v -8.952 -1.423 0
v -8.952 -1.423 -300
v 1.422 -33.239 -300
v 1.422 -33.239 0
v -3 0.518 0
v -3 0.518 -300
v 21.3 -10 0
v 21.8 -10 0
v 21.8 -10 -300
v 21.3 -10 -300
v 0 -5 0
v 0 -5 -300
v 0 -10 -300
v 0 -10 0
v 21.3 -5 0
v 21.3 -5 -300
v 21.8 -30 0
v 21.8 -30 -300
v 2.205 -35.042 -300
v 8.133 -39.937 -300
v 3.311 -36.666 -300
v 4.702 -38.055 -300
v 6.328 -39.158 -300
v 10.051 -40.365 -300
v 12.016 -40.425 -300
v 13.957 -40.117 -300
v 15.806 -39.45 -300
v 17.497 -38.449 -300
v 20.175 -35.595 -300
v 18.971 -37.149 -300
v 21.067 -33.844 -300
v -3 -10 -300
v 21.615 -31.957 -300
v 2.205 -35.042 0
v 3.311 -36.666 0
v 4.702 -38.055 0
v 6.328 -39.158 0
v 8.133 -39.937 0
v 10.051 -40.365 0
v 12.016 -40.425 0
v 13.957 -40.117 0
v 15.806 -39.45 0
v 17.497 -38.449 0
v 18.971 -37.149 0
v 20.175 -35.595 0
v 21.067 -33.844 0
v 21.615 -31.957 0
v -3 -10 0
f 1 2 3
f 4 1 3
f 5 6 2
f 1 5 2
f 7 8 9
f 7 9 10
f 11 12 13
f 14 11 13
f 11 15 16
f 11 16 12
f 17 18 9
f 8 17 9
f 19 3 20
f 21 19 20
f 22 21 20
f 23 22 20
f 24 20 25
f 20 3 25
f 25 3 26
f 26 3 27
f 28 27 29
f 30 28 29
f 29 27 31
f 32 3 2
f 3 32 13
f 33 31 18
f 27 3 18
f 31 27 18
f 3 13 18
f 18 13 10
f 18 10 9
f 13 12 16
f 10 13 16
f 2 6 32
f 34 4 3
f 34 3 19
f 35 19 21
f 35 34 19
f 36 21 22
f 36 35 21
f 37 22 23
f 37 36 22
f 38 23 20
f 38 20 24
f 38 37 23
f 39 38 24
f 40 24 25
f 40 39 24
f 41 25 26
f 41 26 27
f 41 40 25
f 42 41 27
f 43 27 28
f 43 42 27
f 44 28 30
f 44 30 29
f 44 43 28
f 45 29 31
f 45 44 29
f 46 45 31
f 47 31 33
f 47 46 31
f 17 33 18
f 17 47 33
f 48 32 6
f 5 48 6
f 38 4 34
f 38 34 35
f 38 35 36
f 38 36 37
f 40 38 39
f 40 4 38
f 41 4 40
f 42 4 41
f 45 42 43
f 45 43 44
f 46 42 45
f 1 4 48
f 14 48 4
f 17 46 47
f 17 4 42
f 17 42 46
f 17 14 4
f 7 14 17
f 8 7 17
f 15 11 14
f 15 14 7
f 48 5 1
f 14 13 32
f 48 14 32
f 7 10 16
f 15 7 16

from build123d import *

# Parameters (mm, degrees)
BOSS_EXTRUDE1_DEPTH = 300


with BuildPart() as part:
    # Sketch1 → Boss-Extrude1 (new body)
    with BuildSketch(Plane.XY):
        with BuildLine():
            Line((0, -5), (0, -10))
            Line((0, -10), (-3, -10))
            Line((-3, -10), (-3, 0.518235133))
            Line((-3, 0.518235133), (-8.952395517, -1.422763405))
            Line((-8.952395517, -1.422763405), (1.422311977, -33.238533054))
            ThreePointArc((1.422311977, -33.238533054), (12.993401498, -40.316712963), (21.8, -30))
            Line((21.8, -30), (21.8, -10))
            Line((21.8, -10), (21.3, -10))
            Line((21.3, -10), (21.3, -5))
            Line((21.3, -5), (0, -5))
        make_face()
    extrude(amount=-BOSS_EXTRUDE1_DEPTH)


solid = part.part
